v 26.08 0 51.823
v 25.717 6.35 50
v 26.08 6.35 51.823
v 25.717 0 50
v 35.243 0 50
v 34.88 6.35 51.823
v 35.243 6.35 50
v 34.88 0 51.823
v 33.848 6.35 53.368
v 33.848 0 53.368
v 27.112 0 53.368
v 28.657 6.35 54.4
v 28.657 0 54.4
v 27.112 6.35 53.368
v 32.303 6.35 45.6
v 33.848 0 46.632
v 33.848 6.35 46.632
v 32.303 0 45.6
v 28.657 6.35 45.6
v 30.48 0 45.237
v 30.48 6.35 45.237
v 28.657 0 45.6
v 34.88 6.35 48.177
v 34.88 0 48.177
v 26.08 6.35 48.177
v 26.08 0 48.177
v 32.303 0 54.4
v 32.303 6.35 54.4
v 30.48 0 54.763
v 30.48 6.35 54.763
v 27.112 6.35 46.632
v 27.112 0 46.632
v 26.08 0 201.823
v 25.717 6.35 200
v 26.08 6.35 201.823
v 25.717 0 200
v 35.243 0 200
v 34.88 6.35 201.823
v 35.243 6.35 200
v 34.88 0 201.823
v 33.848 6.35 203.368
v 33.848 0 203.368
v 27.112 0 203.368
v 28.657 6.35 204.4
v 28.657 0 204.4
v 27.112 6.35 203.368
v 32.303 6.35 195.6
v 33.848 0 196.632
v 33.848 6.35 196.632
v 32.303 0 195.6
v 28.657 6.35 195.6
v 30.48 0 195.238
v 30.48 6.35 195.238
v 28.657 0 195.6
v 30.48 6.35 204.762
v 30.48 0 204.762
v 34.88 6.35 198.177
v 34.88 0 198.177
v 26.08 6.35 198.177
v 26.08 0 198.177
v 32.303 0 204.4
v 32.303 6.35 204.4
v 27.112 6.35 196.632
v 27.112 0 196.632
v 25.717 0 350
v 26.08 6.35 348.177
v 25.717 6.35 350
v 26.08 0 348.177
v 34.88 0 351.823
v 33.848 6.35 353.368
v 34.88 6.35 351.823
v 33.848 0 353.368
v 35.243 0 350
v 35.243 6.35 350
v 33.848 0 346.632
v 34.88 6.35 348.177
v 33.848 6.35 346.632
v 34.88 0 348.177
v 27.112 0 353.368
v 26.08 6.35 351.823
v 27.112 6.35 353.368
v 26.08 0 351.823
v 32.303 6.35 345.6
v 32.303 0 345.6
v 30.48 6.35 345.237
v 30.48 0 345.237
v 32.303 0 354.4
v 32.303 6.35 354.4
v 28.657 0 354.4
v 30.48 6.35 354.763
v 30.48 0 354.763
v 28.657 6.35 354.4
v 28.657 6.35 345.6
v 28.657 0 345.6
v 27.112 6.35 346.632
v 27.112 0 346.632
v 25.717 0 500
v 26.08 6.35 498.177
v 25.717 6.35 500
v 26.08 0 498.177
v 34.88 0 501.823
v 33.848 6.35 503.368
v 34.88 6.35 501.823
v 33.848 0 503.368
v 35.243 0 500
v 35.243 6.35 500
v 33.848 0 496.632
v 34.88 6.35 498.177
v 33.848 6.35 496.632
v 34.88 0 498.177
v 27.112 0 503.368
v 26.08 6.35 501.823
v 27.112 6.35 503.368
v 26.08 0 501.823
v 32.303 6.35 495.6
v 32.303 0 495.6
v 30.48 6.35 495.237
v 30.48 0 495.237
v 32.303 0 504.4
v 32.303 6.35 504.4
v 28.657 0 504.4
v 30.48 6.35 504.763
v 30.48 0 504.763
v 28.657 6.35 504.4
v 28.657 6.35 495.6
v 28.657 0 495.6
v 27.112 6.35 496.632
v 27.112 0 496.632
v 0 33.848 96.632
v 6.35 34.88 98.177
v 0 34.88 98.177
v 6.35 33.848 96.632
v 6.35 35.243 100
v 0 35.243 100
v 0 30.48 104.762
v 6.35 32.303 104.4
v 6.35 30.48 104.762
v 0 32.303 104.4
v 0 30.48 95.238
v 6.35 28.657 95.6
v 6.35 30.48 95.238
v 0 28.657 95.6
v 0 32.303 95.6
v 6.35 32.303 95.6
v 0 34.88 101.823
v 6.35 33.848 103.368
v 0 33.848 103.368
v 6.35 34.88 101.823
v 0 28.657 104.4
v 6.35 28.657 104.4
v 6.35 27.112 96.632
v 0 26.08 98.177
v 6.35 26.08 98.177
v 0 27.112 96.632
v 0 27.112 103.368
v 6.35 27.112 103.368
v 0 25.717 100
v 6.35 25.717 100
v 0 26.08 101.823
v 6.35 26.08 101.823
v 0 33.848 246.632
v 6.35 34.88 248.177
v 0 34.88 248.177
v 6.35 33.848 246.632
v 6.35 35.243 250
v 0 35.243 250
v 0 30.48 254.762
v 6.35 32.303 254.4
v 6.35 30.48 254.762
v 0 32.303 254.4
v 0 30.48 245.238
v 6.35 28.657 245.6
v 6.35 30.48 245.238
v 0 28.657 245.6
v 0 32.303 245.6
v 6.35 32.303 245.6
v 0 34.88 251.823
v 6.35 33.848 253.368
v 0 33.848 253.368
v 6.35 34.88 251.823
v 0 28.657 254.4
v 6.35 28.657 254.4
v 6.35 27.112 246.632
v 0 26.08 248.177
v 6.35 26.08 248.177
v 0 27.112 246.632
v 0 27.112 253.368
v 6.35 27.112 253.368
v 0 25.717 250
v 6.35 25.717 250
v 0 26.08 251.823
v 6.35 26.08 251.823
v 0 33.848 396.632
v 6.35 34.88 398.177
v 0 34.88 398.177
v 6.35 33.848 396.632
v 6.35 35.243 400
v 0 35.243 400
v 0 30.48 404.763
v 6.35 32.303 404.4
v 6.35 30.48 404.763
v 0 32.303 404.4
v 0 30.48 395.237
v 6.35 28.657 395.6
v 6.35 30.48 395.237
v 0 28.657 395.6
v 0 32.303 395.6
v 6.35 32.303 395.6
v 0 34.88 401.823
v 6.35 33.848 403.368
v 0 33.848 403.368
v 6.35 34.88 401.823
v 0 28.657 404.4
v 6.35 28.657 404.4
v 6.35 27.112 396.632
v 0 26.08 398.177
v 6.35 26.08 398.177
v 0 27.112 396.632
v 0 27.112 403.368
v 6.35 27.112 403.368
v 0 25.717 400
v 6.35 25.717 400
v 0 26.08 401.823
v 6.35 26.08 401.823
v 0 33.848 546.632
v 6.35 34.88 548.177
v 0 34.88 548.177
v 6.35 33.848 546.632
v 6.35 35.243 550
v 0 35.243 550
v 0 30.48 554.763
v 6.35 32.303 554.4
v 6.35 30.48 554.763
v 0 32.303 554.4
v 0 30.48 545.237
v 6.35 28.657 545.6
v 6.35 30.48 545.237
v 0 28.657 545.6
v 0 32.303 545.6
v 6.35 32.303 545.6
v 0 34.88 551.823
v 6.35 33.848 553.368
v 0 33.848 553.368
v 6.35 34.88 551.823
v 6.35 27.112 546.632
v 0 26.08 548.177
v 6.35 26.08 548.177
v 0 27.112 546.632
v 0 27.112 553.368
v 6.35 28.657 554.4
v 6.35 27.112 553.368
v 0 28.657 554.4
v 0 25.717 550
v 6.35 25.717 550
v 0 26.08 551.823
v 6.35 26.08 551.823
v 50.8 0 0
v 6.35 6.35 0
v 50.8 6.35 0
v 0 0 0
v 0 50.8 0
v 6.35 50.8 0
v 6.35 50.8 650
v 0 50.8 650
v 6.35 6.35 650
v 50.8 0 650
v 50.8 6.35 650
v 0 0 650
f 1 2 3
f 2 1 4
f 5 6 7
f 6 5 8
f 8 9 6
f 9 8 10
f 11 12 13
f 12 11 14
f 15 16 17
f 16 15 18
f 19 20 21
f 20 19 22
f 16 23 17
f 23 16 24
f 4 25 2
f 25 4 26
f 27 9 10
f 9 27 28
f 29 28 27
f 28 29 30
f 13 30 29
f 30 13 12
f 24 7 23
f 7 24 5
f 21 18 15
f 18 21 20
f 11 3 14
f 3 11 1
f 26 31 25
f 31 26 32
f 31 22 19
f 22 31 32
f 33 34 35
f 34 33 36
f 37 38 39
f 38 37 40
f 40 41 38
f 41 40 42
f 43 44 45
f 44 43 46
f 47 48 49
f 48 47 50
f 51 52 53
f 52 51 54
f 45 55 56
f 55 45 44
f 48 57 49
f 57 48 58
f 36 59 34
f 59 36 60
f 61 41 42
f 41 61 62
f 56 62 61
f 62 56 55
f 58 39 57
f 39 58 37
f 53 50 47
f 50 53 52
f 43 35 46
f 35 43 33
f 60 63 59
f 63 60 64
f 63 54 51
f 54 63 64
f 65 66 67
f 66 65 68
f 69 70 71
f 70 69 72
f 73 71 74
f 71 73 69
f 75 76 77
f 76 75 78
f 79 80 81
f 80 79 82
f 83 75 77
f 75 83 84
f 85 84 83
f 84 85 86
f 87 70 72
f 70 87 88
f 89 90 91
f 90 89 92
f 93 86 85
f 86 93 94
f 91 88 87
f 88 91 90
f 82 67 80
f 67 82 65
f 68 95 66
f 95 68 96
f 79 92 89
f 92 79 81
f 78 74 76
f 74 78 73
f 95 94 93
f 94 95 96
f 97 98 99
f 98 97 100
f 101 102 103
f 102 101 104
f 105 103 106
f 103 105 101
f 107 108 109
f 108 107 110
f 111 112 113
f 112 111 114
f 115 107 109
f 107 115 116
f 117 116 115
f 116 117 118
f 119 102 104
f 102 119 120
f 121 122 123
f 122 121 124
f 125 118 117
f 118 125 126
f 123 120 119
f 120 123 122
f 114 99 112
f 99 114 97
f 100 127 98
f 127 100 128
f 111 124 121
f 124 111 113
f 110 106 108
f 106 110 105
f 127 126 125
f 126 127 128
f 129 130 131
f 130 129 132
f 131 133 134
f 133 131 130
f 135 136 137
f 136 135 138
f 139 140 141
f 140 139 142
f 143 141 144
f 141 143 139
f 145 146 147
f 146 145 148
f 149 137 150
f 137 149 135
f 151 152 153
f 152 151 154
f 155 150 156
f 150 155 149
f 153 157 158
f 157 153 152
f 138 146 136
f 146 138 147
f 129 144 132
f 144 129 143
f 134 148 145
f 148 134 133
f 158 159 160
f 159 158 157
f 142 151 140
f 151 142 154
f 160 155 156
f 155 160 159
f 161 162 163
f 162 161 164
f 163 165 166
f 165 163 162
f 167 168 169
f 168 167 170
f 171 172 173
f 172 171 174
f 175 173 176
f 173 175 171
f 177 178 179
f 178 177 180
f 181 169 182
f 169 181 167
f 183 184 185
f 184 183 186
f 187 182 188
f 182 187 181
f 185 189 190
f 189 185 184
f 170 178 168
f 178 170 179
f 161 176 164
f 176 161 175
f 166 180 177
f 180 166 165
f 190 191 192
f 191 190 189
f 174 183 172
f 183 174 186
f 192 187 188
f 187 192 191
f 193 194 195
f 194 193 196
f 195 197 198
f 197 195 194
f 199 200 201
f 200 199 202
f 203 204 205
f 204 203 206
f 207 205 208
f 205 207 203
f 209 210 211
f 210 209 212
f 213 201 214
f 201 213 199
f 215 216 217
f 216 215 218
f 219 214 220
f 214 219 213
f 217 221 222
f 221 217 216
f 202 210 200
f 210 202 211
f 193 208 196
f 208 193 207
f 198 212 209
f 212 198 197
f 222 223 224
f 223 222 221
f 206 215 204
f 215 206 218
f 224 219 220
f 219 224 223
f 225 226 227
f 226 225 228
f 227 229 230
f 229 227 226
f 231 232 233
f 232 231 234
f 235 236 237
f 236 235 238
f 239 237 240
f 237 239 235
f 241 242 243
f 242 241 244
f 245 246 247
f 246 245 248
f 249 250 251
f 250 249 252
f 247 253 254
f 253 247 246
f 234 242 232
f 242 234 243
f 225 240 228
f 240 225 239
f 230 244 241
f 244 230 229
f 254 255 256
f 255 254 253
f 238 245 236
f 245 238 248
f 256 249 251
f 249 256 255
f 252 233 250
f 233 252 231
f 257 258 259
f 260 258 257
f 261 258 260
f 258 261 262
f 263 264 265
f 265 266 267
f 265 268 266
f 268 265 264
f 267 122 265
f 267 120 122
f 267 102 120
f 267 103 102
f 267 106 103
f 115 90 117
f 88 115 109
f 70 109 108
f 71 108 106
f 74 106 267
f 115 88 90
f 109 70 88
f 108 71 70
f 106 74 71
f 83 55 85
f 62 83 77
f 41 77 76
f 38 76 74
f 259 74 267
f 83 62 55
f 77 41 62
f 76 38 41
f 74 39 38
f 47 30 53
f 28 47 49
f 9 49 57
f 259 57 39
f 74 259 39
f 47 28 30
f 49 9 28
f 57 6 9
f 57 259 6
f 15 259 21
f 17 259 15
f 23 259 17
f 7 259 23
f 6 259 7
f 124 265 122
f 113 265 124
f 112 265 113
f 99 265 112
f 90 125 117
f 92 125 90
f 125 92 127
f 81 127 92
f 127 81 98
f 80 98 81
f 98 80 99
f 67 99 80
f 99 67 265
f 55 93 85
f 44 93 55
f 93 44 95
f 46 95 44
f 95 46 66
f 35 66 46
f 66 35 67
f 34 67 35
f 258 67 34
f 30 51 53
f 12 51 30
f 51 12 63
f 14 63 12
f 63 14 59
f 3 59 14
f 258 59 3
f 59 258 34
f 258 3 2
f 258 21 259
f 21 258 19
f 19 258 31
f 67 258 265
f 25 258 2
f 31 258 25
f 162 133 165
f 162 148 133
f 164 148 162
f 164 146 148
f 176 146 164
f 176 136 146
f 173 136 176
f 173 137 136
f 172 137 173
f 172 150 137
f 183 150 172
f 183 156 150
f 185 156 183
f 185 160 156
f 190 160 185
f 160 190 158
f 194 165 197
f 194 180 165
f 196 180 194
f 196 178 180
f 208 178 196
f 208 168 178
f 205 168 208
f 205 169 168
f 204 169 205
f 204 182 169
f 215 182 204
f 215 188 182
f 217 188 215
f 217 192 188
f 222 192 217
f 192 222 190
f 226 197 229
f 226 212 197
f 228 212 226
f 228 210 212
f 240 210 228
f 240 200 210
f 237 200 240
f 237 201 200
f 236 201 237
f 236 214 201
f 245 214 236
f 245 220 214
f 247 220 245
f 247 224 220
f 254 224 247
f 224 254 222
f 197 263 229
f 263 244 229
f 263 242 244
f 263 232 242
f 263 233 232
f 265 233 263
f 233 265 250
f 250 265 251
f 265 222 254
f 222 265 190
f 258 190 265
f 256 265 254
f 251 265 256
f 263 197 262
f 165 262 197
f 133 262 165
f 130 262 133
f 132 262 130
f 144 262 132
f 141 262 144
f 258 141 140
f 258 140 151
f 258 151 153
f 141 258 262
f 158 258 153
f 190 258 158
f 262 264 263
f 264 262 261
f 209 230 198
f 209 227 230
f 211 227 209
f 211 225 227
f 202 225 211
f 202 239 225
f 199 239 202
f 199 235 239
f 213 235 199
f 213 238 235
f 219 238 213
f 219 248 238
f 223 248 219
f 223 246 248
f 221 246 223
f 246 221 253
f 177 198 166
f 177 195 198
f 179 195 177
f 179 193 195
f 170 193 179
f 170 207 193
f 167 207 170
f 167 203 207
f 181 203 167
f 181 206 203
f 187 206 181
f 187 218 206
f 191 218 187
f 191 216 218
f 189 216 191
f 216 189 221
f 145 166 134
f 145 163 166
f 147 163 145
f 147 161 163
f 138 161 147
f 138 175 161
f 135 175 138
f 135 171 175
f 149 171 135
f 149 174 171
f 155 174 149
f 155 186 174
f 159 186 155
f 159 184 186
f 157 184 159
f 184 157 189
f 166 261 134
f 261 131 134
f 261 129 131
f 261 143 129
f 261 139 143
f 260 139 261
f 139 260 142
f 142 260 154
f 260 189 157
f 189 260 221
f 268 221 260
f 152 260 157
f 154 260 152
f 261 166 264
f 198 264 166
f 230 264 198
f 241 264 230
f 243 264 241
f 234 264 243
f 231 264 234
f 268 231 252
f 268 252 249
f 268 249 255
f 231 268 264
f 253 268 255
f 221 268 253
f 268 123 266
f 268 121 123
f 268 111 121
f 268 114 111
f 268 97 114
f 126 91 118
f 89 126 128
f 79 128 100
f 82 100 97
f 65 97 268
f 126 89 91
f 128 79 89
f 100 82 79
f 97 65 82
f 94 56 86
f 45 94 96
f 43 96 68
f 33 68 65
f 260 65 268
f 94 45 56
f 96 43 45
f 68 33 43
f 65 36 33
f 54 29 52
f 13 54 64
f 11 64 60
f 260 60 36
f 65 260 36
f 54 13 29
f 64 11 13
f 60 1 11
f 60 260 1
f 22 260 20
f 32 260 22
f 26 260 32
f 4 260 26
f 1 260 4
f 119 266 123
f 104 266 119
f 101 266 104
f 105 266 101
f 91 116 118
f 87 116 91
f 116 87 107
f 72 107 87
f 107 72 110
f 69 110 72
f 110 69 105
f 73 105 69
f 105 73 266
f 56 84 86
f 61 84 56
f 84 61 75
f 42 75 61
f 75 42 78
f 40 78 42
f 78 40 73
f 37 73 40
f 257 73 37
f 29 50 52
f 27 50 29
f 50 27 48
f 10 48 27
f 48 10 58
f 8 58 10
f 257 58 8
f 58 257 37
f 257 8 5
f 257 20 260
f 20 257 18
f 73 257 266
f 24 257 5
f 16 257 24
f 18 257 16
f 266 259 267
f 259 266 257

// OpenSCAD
// Part A1: Back Stiffener - Outer Wall Vertical Angle Iron
// Material: 2"×2"×1/4" Angle Iron (50.8mm × 6.35mm)
// Quantity: 2 pieces
// Location: Back stiffener plate, left and right outer walls
//
// This file defines a single structural steel part used in the LifeTrac v25 assembly.
// The angle iron runs vertically, connecting the back stiffener plate to the outer wall panels.

include <../../lifetrac_v25_params.scad>

// =============================================================================
// PART DIMENSIONS (calculated from assembly parameters)
// =============================================================================

// Back stiffener plate vertical extent
_back_y_pos = 25.4;  // 1 inch from rear
_back_z_start = FRAME_Z_OFFSET + 350;
_back_z_end = FRAME_Z_OFFSET + MACHINE_HEIGHT;

// Part dimensions
PART_A1_HEIGHT = _back_z_end - _back_z_start;
PART_A1_LEG = 50.8;      // 2" leg
PART_A1_THICK = 6.35;    // 1/4" thickness
PART_A1_BOLT_DIA = 9.525; // 3/8" bolts
PART_A1_HOLE_OFFSET = PART_A1_LEG * 0.6;  // Offset from corner for tool clearance

// Hole spacing pattern (parametric based on height)
function get_stiffener_holes_a_local(h) = 
    let(
        start_offset = 50,
        end_offset = 50,
        spacing = 150,
        count = floor((h - start_offset - end_offset) / spacing) + 1
    )
    [for (i = [0:count-1]) start_offset + i * spacing];

function get_stiffener_holes_b_local(h) = 
    let(
        start_offset = 100,
        end_offset = 50,
        spacing = 150,
        count = floor((h - start_offset - end_offset) / spacing) + 1
    )
    [for (i = [0:count-1]) start_offset + i * spacing];

// Generate hole position arrays
PART_A1_HOLES_LEG_A = get_stiffener_holes_a_local(PART_A1_HEIGHT);
PART_A1_HOLES_LEG_B = get_stiffener_holes_b_local(PART_A1_HEIGHT);

// =============================================================================
// MAIN MODULE
// =============================================================================

/**
 * Part A1: Back Stiffener Outer Wall Vertical Angle Iron
 * 
 * Orientation:
 *   - Extrudes along Z axis (vertical)
 *   - Corner at origin [0,0,0]
 *   - Leg A extends along +X (against wall panel)
 *   - Leg B extends along +Y (against stiffener plate)
 *
 * @param show_holes If true, drill bolt holes; if false, show solid angle
 */
module _part_a1_back_outer_vertical(show_holes=true) {
    height = PART_A1_HEIGHT;
    leg = PART_A1_LEG;
    thick = PART_A1_THICK;
    bolt_dia = PART_A1_BOLT_DIA;
    hole_offset = PART_A1_HOLE_OFFSET;
    
    color("DarkGray")
    difference() {
        // L-profile extruded along Z
        // Origin at corner, legs extend along +X and +Y
        linear_extrude(height=height)
        polygon([
            [0, 0],
            [leg, 0],
            [leg, thick],
            [thick, thick],
            [thick, leg],
            [0, leg]
        ]);
        
        if (show_holes) {
            // Holes on Leg A (X-leg) - bolts through in Y direction
            for (z = PART_A1_HOLES_LEG_A) {
                translate([hole_offset, 0, z])
                rotate([90, 0, 0])
                cylinder(d=bolt_dia, h=40, center=true, $fn=16);
            }
            
            // Holes on Leg B (Y-leg) - bolts through in X direction
            for (z = PART_A1_HOLES_LEG_B) {
                translate([0, hole_offset, z])
                rotate([0, 90, 0])
                cylinder(d=bolt_dia, h=40, center=true, $fn=16);
            }
        }
    }
}

// =============================================================================
// RENDER
// =============================================================================

// Render the part when this file is opened directly
_part_a1_back_outer_vertical(show_holes=true);

// Echo part specifications
echo("=== PART A1: Back Stiffener Outer Wall Vertical ===");
echo("Height:", PART_A1_HEIGHT, "mm");
echo("Leg size:", PART_A1_LEG, "mm");
echo("Thickness:", PART_A1_THICK, "mm");
echo("Bolt diameter:", PART_A1_BOLT_DIA, "mm");
echo("Holes Leg A:", len(PART_A1_HOLES_LEG_A));
echo("Holes Leg B:", len(PART_A1_HOLES_LEG_B));
